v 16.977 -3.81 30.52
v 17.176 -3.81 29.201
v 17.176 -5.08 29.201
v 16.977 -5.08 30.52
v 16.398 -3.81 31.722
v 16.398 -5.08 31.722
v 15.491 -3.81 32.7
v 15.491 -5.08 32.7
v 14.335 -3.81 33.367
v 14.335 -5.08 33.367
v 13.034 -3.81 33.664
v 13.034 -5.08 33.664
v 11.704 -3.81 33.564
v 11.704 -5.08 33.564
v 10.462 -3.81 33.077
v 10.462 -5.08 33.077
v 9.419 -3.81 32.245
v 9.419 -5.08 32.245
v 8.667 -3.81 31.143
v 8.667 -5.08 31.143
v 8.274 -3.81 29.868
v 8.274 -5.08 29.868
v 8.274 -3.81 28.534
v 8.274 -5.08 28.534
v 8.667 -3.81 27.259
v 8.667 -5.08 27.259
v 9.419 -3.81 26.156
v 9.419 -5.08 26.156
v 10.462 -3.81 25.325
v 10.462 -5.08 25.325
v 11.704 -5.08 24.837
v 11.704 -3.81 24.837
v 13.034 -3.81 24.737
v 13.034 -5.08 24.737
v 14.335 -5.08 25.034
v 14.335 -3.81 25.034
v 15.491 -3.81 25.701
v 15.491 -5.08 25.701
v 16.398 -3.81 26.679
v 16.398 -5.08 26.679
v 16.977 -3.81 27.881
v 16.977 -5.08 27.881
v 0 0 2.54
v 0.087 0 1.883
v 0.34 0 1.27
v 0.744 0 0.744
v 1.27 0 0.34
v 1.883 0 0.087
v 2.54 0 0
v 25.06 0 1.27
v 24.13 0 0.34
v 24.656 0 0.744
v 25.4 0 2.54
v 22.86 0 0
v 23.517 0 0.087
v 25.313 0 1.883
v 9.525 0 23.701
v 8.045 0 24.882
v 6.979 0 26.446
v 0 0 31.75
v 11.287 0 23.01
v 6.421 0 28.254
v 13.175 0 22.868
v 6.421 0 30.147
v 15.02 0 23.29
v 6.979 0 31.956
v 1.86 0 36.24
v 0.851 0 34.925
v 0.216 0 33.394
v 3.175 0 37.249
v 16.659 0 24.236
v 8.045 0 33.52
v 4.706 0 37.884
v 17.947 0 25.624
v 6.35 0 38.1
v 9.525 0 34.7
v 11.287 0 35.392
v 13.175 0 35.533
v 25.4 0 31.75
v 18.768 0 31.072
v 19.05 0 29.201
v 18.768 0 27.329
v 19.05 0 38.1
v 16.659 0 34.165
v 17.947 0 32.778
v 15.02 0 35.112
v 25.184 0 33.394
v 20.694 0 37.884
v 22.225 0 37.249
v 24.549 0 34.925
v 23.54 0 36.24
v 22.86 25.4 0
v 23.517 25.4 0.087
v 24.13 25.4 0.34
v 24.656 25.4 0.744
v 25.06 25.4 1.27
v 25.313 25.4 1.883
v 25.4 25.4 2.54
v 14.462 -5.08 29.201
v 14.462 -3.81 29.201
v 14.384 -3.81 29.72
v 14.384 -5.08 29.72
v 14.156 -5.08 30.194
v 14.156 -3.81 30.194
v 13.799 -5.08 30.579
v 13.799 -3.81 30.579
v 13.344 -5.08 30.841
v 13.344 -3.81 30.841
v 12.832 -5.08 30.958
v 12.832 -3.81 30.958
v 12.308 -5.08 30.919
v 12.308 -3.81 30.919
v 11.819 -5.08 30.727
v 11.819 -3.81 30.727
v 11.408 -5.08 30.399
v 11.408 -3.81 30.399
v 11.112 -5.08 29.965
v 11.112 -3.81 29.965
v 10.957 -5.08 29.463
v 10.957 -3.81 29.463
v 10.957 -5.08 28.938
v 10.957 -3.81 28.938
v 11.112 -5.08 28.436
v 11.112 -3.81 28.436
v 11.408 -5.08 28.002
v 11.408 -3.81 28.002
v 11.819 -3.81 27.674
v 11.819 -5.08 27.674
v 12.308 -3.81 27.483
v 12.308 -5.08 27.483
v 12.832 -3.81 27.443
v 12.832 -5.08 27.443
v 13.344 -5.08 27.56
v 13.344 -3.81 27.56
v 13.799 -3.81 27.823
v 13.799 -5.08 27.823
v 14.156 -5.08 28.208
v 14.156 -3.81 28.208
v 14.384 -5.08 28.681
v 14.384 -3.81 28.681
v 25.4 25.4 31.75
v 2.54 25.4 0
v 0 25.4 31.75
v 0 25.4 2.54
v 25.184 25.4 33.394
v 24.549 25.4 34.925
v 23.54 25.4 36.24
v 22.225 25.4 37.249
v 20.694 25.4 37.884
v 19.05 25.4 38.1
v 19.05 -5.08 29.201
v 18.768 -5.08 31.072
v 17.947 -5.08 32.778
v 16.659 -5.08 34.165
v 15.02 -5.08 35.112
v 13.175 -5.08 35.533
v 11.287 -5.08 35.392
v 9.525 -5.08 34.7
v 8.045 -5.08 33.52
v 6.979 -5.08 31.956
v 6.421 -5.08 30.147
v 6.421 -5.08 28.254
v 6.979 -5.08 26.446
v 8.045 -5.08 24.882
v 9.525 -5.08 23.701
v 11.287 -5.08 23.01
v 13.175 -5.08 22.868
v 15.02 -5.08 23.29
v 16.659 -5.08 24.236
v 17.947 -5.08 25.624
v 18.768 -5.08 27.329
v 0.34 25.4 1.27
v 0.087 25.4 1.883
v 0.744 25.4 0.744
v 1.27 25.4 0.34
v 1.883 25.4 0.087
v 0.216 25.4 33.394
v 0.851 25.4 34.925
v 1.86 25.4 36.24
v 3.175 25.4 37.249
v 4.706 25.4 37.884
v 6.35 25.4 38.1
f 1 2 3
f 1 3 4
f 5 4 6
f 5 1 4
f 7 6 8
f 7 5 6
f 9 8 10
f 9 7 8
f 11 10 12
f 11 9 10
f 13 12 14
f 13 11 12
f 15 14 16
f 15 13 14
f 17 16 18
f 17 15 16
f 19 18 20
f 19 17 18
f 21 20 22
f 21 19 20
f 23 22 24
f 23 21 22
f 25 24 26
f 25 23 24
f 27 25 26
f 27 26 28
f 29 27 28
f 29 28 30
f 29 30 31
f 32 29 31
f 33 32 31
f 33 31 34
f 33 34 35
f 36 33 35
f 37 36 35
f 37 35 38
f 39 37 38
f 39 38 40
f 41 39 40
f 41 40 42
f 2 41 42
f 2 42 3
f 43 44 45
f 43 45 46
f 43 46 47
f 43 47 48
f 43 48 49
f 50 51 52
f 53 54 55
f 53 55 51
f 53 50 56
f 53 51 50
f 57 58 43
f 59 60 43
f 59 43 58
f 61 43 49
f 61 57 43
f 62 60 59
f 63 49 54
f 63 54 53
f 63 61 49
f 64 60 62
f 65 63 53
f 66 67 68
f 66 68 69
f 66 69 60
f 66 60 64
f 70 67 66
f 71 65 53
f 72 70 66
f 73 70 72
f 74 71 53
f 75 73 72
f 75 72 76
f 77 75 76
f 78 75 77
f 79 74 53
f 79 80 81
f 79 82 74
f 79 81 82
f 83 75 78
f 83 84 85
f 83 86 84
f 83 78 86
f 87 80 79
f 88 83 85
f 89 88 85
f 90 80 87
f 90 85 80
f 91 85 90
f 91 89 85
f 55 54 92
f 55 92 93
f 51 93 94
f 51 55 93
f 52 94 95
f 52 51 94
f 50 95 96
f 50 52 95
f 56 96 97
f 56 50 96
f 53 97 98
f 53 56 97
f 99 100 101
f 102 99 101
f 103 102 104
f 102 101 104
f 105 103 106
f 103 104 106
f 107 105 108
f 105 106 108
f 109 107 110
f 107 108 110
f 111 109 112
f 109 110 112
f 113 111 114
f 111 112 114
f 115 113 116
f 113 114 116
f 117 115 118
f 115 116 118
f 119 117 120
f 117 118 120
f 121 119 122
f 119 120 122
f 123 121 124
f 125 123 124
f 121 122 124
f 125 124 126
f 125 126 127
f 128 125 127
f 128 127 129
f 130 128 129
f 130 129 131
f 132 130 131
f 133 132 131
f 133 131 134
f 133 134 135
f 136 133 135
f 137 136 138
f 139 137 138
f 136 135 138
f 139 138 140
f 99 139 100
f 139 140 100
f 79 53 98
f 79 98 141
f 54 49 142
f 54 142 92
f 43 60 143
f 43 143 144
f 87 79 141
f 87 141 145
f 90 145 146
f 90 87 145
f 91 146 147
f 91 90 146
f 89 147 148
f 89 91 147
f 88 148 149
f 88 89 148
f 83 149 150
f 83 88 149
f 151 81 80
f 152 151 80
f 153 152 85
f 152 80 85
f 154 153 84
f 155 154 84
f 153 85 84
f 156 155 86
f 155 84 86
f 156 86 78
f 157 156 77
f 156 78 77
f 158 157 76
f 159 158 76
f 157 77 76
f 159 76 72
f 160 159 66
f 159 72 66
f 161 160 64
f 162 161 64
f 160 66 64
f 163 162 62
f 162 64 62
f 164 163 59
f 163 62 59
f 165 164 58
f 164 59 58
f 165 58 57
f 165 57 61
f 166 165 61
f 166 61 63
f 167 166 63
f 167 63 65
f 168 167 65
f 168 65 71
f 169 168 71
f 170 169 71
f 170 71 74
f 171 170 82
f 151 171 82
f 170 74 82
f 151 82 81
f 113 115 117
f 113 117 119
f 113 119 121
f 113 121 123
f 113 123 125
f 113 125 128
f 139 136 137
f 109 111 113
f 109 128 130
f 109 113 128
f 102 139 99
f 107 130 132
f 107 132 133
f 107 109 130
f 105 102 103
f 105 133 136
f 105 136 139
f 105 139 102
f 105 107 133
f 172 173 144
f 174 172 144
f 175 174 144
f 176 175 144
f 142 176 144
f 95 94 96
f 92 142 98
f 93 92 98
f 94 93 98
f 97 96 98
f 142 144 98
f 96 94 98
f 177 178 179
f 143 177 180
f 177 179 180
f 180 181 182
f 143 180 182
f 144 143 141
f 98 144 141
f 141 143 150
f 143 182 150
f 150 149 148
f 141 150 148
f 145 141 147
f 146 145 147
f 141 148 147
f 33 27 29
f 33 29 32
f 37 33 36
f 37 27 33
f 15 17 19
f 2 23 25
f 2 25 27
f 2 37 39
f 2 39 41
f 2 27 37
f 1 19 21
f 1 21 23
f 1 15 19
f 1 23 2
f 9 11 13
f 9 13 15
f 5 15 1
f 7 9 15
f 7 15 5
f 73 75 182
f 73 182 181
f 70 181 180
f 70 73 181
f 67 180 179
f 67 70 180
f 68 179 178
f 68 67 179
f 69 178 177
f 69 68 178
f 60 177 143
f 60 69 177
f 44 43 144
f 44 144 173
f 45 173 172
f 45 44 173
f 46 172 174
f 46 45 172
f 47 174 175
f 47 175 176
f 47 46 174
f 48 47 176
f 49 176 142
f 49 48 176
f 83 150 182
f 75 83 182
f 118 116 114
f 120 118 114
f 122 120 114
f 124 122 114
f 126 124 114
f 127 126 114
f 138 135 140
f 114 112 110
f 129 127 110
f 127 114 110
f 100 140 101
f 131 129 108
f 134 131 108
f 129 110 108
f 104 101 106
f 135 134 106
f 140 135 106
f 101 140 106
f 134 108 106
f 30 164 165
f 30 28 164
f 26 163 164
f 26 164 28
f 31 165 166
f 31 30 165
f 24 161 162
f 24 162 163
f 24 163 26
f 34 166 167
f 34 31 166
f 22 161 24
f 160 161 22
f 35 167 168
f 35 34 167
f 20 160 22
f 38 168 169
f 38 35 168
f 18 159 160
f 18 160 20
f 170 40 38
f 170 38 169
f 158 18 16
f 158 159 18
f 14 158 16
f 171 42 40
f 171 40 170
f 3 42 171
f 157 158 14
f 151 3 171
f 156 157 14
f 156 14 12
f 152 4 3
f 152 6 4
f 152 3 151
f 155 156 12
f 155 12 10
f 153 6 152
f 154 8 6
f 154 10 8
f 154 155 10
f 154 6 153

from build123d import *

# Parameters (mm, degrees)
F1_DEPTH = 25.4
F2_R     = 6.35
F2_R_2   = 4.4758717648
F3_DEPTH = 5.08
F4_DEPTH = 3.81
F5_R     = 1.7624127153
F6_DEPTH = 1.27


with BuildPart() as f1:
    # F0 (on Front) → F1 (new body)
    with BuildSketch(Plane.XZ):
        with BuildLine():
            Line((0, 31.75), (0, 2.54))
            ThreePointArc((0, 2.54), (0.7439487758, 0.7439487758), (2.54, 0))
            Line((2.54, 0), (22.86, 0))
            ThreePointArc((22.86, 0), (24.6560512242, 0.7439487758), (25.4, 2.54))
            Line((25.4, 2.54), (25.4, 31.75))
            ThreePointArc((25.4, 31.75), (23.5401280605, 36.2401280605), (19.05, 38.1))
            Line((19.05, 38.1), (6.35, 38.1))
            ThreePointArc((6.35, 38.1), (1.8598719395, 36.2401280605), (0, 31.75))
        make_face()
    extrude(amount=-F1_DEPTH)

    # F2 (on face) → F3 (join)
    with BuildSketch(Plane.XZ):
        with Locations((12.7, 29.2007308453)):
            Circle(F2_R)
        with Locations((12.7, 29.2007308453)):
            Circle(F2_R_2, mode=Mode.SUBTRACT)
    extrude(amount=F3_DEPTH)

    # F4 (add): a face of the model
    f4_faces = [f1.faces().sort_by_distance(p)[0] for p in [
        (12.7, 0, 29.2007308453),
    ]]
    extrude(f4_faces, amount=F4_DEPTH)


with BuildPart() as f6:
    # F5 (on face) → F6 (new body)
    with BuildSketch(Plane.XZ.offset(3.81)):
        with Locations((12.7, 29.2007308453)):
            Circle(F5_R)
    extrude(amount=F6_DEPTH)


solid = Compound([f1.part, f6.part])
